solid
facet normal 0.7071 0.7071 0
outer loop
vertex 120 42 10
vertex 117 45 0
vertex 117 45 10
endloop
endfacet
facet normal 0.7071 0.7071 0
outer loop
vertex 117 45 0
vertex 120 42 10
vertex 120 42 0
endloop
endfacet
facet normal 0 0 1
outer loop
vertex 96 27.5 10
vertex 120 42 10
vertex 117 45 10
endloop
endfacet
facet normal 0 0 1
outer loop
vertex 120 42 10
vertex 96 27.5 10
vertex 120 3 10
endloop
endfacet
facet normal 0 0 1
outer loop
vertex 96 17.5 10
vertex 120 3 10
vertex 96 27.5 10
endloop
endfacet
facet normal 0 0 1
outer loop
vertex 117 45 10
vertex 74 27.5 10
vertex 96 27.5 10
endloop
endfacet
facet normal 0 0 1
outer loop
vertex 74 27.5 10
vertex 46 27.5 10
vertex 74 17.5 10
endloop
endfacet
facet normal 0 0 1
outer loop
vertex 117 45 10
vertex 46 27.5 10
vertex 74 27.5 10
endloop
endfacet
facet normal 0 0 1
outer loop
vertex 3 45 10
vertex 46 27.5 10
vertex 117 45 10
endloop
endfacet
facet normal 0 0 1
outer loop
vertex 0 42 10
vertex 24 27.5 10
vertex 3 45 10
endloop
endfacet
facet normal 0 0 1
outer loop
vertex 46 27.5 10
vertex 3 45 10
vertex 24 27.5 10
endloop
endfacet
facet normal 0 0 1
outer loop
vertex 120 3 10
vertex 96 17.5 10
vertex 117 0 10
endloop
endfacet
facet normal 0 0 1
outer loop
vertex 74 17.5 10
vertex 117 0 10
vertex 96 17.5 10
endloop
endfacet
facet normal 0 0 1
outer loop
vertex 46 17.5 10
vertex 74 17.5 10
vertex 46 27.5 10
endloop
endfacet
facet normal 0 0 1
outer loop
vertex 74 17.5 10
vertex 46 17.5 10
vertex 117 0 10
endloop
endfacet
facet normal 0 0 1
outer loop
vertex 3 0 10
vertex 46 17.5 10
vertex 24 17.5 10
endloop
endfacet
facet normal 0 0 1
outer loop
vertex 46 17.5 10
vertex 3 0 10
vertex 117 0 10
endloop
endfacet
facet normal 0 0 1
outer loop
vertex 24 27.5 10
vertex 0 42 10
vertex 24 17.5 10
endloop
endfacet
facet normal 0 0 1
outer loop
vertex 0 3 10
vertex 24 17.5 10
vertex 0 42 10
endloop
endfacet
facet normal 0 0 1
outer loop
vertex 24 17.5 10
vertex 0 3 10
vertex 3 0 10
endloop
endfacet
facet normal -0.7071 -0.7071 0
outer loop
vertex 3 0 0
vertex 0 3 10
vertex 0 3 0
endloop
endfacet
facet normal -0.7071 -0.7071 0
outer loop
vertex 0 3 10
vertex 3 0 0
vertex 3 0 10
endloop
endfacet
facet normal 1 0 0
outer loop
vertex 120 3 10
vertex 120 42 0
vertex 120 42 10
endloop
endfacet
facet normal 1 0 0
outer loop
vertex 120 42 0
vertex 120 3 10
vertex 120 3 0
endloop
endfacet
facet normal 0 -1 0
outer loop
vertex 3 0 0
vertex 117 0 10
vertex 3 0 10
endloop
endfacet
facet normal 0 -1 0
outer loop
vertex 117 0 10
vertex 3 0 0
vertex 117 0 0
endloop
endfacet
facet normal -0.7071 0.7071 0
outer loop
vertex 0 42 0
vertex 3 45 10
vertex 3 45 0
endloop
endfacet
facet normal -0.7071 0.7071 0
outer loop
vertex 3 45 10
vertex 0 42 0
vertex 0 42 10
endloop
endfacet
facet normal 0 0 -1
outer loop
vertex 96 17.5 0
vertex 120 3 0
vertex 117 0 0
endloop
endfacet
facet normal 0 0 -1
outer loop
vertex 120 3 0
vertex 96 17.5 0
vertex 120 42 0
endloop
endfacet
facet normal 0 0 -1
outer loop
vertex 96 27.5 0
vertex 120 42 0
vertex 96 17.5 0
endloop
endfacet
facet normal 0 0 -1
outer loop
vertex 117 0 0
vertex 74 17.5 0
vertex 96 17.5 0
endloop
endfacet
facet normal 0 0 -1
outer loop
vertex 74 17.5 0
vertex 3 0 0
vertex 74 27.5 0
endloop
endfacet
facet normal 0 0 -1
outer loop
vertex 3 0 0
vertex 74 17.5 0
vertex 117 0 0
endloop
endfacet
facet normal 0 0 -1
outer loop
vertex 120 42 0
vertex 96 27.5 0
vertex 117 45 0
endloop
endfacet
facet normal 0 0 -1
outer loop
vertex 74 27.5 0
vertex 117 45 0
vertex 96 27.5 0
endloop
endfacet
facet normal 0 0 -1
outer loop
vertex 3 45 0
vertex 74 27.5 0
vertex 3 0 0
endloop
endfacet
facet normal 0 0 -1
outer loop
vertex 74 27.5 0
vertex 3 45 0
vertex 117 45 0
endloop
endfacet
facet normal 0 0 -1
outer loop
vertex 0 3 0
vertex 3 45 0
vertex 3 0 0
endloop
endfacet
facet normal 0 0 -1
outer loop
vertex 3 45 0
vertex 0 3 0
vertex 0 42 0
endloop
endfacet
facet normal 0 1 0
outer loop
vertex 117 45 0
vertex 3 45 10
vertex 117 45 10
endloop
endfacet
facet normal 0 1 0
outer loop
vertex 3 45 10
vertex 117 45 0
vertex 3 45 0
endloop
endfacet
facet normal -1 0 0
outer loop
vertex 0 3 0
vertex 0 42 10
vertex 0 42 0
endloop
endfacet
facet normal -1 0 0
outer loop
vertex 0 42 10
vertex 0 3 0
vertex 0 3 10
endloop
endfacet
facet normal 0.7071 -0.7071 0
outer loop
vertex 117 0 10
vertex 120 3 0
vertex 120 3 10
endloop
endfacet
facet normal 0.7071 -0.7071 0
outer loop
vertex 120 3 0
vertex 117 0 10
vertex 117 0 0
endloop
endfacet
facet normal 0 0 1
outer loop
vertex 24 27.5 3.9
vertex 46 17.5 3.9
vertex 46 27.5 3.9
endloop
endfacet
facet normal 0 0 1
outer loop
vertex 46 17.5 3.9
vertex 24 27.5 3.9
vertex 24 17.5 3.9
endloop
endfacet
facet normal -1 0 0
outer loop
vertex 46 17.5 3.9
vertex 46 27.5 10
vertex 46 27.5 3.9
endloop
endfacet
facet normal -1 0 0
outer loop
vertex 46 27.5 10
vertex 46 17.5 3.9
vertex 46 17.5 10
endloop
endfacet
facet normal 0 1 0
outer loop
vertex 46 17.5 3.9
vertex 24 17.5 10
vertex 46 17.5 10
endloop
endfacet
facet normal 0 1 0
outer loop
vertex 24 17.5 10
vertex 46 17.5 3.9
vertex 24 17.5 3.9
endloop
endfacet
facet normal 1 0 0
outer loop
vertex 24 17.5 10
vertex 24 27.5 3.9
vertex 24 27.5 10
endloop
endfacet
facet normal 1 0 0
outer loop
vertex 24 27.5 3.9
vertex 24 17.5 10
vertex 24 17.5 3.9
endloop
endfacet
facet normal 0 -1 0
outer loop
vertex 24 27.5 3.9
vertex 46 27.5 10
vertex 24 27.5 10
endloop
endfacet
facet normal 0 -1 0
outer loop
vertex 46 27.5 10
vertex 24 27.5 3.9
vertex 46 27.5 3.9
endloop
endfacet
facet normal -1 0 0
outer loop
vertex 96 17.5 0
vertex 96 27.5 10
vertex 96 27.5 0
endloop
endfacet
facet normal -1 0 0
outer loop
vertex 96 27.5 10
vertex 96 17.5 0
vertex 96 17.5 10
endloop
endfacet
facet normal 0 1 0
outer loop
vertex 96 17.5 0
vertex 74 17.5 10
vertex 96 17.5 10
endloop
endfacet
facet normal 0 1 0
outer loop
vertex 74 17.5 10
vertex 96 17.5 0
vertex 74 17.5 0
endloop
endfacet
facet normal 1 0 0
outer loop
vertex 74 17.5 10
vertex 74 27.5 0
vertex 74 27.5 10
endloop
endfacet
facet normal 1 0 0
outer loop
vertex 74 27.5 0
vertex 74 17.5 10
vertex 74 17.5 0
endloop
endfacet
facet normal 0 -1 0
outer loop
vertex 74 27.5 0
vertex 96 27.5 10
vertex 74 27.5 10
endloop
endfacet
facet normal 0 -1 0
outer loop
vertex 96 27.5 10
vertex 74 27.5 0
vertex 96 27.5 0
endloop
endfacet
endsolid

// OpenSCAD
$fn = 32;

// ----------------------------------------------------------------------
// Windowed plate: 2 voids, 120 x 45 x 10 mm
// ----------------------------------------------------------------------

// --- parameters (mm) ---
plate_l = 120;            // plate length, X
plate_w = 45;             // plate width, Y
plate_t = 10;             // plate thickness, Z
edge_margin = 10;         // wall from the plate edge to any window
windows = 2;              // number of windows in the row
win_l = 22;               // window length
win_w = 10;               // window width
win_pitch = 50;           // window pitch along X
depth_1 = 6.1;            // depth of void 1 (full thickness = through)
depth_2 = 10;             // depth of void 2 (full thickness = through)
corner_c = 3;             // corner chamfer of the plate
fit_tol = 0.1;            // declared fit tolerance (prompt contract)
free_tol = 0.3;           // declared free tolerance (prompt contract)

profile = [[3, 0], [117, 0], [120, 3], [120, 42], [117, 45], [3, 45], [0, 42], [0, 3]];  // primary outline, 8 points, counter clockwise
void_1 = [[24, 17.5], [46, 17.5], [46, 27.5], [24, 27.5]];  // window 1 of the row, 4 points
void_2 = [[74, 17.5], [96, 17.5], [96, 27.5], [74, 27.5]];  // window 2 of the row, 4 points

// --- the one profile operation ---
difference() {
  linear_extrude(height = plate_t) polygon(points = profile);
  translate([0, 0, plate_t - depth_1])
    linear_extrude(height = depth_1 + 1) polygon(points = void_1);
  translate([0, 0, -1])
    linear_extrude(height = plate_t + 2) polygon(points = void_2);
}
